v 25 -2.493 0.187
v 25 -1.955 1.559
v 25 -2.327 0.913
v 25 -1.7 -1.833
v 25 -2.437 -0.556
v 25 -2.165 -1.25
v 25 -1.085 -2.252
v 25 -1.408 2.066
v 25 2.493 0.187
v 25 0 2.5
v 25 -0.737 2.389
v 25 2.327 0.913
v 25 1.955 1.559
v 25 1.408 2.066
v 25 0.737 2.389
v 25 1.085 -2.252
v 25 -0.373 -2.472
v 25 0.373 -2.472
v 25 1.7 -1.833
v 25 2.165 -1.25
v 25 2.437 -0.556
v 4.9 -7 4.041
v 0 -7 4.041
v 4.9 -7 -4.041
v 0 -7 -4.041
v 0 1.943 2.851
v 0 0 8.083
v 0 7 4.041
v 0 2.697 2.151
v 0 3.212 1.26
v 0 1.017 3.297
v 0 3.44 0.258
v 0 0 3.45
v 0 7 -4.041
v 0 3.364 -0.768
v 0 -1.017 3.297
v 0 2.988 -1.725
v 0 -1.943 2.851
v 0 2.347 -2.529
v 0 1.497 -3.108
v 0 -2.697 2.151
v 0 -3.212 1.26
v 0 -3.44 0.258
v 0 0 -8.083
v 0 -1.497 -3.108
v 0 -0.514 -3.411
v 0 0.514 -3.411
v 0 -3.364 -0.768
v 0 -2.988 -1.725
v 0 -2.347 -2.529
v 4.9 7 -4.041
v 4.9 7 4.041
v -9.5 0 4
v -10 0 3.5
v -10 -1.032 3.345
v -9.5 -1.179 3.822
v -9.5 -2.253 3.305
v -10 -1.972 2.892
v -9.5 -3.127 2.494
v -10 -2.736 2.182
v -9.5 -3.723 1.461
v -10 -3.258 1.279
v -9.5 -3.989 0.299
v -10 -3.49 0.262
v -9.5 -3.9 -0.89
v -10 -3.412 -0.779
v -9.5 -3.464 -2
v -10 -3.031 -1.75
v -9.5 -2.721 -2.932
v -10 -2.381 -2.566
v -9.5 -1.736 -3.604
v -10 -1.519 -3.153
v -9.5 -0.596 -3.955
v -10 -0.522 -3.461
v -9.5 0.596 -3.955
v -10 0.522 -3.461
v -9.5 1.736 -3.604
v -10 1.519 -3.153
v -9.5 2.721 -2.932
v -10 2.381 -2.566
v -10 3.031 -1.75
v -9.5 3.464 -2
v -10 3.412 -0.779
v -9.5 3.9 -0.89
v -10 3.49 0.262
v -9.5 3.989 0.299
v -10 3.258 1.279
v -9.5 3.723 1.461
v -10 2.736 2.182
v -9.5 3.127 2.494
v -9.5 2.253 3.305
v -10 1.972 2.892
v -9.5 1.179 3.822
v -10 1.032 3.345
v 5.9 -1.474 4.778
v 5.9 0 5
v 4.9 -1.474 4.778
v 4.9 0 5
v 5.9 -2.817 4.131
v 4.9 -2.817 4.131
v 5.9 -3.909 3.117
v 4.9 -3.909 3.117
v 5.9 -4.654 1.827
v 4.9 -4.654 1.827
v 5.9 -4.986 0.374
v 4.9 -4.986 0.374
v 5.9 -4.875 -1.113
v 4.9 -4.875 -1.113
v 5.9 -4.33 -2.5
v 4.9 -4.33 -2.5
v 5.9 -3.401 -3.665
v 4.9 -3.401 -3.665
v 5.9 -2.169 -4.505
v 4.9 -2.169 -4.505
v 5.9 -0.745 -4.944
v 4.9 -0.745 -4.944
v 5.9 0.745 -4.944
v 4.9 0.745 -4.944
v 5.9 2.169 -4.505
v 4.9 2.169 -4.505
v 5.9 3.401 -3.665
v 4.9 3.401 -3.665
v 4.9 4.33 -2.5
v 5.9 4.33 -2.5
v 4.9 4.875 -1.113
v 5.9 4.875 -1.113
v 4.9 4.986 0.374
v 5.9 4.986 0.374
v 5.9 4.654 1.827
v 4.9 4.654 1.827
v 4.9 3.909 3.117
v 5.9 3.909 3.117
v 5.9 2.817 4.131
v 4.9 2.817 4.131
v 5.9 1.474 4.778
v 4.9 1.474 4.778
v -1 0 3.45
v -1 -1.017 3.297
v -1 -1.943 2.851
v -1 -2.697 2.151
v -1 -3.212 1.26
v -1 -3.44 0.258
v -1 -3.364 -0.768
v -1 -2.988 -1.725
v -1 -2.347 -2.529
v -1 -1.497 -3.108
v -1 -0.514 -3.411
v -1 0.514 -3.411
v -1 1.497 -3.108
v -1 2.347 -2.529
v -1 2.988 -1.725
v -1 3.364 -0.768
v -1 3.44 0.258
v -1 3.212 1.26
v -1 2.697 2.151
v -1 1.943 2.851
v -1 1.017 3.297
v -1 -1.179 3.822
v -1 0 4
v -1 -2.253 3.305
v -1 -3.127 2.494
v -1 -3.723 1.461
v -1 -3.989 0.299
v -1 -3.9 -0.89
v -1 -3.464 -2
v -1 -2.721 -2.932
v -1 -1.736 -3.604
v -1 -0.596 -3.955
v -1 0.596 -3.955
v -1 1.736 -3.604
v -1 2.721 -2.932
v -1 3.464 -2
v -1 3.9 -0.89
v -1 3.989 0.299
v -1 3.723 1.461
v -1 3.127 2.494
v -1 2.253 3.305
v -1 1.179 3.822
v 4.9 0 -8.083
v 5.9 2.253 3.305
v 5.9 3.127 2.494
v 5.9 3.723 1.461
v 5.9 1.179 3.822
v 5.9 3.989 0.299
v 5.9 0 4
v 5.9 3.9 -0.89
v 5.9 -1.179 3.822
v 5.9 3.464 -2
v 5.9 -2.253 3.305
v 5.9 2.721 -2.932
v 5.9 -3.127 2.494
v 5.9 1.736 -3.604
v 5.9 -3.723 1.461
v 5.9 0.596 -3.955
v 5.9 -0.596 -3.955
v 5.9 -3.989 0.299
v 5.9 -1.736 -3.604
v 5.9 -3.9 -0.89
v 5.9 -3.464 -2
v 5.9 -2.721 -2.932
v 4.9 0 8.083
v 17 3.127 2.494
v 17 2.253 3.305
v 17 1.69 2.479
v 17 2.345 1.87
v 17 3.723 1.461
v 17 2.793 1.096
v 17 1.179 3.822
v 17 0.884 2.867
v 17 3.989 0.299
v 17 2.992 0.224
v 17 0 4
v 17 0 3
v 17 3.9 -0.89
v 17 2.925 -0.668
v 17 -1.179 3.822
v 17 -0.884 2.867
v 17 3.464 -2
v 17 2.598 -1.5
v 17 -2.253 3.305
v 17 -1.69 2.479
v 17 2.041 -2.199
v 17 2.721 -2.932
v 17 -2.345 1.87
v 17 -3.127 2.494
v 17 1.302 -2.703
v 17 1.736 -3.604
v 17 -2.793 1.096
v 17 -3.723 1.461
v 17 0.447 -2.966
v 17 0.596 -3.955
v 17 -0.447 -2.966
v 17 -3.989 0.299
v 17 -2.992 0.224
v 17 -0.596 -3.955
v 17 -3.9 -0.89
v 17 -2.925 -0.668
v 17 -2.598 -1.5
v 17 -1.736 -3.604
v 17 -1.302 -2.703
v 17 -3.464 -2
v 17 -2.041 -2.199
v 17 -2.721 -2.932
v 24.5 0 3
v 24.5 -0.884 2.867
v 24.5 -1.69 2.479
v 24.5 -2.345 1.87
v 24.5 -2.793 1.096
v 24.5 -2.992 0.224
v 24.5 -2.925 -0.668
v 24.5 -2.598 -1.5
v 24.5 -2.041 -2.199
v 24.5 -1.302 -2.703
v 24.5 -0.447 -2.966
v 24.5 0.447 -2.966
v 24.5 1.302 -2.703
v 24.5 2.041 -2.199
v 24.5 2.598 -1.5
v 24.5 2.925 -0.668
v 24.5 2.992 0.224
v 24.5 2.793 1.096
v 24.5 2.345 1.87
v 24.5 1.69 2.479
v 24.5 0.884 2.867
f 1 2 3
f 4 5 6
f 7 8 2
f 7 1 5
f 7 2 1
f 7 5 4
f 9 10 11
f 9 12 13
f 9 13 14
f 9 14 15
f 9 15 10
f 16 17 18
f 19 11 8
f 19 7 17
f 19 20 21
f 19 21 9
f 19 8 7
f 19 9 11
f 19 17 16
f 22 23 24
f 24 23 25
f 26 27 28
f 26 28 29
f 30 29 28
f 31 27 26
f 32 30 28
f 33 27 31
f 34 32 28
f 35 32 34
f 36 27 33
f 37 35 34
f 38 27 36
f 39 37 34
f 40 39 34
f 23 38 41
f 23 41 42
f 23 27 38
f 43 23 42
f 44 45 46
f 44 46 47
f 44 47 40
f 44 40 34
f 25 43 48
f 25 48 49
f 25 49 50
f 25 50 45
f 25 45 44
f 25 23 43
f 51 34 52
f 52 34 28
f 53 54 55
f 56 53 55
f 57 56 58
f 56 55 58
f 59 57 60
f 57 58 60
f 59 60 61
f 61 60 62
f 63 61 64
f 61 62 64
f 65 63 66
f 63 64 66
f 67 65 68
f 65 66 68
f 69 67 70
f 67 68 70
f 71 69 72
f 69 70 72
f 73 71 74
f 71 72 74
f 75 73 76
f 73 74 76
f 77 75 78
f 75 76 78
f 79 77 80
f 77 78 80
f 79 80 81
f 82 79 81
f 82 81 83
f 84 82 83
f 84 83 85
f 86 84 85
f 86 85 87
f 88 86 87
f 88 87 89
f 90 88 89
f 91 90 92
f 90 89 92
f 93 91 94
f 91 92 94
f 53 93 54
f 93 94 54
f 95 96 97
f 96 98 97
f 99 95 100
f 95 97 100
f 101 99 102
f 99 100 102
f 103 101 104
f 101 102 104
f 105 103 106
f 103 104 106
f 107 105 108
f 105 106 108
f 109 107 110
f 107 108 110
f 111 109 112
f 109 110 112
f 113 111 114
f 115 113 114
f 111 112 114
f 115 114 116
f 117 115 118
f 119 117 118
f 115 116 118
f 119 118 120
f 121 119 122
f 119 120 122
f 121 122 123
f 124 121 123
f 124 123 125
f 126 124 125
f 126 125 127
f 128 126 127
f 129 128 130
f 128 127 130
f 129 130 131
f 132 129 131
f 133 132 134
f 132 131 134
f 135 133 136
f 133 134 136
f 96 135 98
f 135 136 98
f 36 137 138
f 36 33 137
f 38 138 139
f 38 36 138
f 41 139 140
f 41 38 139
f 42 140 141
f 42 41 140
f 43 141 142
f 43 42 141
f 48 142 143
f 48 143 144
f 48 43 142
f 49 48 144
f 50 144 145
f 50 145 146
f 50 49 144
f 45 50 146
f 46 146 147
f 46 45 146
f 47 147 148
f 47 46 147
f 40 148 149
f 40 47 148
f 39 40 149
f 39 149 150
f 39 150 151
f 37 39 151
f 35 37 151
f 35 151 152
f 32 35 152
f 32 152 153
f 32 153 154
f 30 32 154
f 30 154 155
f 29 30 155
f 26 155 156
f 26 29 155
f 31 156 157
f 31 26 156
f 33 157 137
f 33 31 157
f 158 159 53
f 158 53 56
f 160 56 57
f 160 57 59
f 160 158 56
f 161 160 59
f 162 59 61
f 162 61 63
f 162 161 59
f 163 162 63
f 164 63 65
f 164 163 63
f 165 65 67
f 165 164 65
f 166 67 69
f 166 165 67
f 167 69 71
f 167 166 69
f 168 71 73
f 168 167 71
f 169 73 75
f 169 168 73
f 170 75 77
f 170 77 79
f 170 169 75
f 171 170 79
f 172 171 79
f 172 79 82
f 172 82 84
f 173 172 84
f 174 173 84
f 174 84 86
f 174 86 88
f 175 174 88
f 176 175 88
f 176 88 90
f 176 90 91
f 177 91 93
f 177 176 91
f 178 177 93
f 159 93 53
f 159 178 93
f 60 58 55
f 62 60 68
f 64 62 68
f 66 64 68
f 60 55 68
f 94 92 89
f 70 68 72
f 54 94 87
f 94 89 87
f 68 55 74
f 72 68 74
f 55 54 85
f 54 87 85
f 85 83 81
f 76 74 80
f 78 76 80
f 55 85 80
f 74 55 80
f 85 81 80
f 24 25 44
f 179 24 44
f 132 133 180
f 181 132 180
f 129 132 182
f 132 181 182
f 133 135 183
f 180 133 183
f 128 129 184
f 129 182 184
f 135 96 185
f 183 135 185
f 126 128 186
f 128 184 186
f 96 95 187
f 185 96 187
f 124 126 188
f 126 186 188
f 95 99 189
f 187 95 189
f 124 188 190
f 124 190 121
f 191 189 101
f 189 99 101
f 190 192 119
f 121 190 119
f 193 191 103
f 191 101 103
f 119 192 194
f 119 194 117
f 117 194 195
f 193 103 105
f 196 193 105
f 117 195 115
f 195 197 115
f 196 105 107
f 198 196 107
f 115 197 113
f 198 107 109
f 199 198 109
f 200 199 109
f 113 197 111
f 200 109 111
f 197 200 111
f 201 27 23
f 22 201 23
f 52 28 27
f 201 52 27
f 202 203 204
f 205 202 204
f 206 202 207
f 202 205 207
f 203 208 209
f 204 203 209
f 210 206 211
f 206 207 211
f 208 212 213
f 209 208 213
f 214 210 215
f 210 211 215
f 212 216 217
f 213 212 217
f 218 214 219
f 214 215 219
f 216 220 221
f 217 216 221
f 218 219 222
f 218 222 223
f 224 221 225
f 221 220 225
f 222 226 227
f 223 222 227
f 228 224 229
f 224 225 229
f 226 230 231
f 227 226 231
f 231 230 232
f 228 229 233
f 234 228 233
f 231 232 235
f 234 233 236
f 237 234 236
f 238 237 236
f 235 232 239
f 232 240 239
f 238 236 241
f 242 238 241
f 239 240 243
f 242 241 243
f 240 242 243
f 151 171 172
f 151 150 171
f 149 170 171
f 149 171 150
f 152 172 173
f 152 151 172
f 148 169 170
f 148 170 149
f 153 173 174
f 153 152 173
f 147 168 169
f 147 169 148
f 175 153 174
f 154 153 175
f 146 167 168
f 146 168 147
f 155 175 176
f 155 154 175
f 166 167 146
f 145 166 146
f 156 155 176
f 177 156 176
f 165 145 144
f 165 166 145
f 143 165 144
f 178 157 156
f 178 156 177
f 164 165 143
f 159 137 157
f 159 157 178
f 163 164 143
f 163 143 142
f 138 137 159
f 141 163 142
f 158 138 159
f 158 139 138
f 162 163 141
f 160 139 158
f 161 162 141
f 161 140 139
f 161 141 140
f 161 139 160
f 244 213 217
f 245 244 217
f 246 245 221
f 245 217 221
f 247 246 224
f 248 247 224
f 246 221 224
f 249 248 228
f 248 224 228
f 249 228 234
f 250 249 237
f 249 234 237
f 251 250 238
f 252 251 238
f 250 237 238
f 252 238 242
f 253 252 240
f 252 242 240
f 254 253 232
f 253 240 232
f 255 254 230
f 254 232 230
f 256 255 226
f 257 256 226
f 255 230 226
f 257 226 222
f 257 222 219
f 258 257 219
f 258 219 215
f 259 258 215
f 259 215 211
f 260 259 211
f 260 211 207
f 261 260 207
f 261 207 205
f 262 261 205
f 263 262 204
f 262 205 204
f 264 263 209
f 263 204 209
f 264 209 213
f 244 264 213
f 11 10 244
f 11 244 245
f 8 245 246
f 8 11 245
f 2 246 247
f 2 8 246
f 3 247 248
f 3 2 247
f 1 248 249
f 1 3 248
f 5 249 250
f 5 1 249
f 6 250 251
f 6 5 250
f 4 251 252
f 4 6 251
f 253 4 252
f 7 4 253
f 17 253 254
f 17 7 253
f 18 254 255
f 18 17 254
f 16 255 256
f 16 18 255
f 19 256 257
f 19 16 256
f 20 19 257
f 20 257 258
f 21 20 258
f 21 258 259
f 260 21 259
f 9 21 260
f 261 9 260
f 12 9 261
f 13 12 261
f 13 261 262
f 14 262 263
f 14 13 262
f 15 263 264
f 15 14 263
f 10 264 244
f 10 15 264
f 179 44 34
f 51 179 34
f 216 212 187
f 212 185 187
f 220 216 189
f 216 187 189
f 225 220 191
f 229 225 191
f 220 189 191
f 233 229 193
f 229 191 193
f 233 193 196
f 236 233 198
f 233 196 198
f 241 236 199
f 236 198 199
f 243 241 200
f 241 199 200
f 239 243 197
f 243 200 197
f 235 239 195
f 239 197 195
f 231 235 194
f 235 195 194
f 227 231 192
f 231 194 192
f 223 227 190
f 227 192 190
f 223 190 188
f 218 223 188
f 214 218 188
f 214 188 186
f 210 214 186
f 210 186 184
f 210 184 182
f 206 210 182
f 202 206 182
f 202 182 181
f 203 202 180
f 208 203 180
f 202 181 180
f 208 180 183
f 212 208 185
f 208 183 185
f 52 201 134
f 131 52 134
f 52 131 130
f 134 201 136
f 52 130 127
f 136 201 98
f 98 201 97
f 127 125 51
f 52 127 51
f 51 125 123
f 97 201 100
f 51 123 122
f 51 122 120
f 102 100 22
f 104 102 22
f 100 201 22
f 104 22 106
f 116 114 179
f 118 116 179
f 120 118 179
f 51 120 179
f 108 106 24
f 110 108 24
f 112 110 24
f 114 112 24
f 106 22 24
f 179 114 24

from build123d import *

# Parameters (mm, degrees)
BOSS_EXTRUDE1_START = -10
BOSS_EXTRUDE1_DEPTH = 35
CHAMFER1_SIZE       = 0.5


with BuildPart() as part:
    # Sketch1 → Boss-Extrude1 (new body)
    with BuildSketch(Plane(origin=(0, 0, 0), x_dir=(0, 0, -1), z_dir=(1, 0, 0)).offset(BOSS_EXTRUDE1_START)):
        Polygon((-8.0829, 0), (-4.04145, -6.999996736), (4.04145, -6.999996736), (8.0829, 0), (4.04145, 6.999996736), (-4.04145, 6.999996736), align=None)
    extrude(amount=BOSS_EXTRUDE1_DEPTH)

    # Sketch2 → Cut-Revolve1 (revolve, cut)
    with BuildSketch(Plane(origin=(0, 0, 0), x_dir=(1, 0, 0), z_dir=(0, 1, 0)), mode=Mode.PRIVATE) as cut_revolve1_sk:
        Polygon((0, 8.0829), (-10, 8.0829), (-10, 4), (-1, 4), (-1, 3.45), (0, 3.45), align=None)
    revolve(cut_revolve1_sk.sketch.rotate(Axis((-12.627683811, 0, 0), (1, 0, 0)), 180), axis=Axis((-12.627683811, 0, 0), (1, 0, 0)), mode=Mode.SUBTRACT)

    # Sketch3 → Cut-Revolve2 (revolve, cut)
    with BuildSketch(Plane(origin=(0, 0, 0), x_dir=(1, 0, 0), z_dir=(0, 1, 0)), mode=Mode.PRIVATE) as cut_revolve2_sk:
        Polygon((25, 8.0829), (25, 3), (17, 3), (17, 4), (5.9, 4), (5.9, 5), (4.9, 5), (4.9, 8.0829), align=None)
    revolve(cut_revolve2_sk.sketch.rotate(Axis((-14.24617289, 0, 0), (1, 0, 0)), 180), axis=Axis((-14.24617289, 0, 0), (1, 0, 0)), mode=Mode.SUBTRACT)

    # Chamfer1
    chamfer1_edges = [part.edges().sort_by_distance(p)[0] for p in [
        (-10, 0, -4),
        (25, 0, -3),
    ]]
    chamfer(chamfer1_edges, length=CHAMFER1_SIZE)


solid = part.part
